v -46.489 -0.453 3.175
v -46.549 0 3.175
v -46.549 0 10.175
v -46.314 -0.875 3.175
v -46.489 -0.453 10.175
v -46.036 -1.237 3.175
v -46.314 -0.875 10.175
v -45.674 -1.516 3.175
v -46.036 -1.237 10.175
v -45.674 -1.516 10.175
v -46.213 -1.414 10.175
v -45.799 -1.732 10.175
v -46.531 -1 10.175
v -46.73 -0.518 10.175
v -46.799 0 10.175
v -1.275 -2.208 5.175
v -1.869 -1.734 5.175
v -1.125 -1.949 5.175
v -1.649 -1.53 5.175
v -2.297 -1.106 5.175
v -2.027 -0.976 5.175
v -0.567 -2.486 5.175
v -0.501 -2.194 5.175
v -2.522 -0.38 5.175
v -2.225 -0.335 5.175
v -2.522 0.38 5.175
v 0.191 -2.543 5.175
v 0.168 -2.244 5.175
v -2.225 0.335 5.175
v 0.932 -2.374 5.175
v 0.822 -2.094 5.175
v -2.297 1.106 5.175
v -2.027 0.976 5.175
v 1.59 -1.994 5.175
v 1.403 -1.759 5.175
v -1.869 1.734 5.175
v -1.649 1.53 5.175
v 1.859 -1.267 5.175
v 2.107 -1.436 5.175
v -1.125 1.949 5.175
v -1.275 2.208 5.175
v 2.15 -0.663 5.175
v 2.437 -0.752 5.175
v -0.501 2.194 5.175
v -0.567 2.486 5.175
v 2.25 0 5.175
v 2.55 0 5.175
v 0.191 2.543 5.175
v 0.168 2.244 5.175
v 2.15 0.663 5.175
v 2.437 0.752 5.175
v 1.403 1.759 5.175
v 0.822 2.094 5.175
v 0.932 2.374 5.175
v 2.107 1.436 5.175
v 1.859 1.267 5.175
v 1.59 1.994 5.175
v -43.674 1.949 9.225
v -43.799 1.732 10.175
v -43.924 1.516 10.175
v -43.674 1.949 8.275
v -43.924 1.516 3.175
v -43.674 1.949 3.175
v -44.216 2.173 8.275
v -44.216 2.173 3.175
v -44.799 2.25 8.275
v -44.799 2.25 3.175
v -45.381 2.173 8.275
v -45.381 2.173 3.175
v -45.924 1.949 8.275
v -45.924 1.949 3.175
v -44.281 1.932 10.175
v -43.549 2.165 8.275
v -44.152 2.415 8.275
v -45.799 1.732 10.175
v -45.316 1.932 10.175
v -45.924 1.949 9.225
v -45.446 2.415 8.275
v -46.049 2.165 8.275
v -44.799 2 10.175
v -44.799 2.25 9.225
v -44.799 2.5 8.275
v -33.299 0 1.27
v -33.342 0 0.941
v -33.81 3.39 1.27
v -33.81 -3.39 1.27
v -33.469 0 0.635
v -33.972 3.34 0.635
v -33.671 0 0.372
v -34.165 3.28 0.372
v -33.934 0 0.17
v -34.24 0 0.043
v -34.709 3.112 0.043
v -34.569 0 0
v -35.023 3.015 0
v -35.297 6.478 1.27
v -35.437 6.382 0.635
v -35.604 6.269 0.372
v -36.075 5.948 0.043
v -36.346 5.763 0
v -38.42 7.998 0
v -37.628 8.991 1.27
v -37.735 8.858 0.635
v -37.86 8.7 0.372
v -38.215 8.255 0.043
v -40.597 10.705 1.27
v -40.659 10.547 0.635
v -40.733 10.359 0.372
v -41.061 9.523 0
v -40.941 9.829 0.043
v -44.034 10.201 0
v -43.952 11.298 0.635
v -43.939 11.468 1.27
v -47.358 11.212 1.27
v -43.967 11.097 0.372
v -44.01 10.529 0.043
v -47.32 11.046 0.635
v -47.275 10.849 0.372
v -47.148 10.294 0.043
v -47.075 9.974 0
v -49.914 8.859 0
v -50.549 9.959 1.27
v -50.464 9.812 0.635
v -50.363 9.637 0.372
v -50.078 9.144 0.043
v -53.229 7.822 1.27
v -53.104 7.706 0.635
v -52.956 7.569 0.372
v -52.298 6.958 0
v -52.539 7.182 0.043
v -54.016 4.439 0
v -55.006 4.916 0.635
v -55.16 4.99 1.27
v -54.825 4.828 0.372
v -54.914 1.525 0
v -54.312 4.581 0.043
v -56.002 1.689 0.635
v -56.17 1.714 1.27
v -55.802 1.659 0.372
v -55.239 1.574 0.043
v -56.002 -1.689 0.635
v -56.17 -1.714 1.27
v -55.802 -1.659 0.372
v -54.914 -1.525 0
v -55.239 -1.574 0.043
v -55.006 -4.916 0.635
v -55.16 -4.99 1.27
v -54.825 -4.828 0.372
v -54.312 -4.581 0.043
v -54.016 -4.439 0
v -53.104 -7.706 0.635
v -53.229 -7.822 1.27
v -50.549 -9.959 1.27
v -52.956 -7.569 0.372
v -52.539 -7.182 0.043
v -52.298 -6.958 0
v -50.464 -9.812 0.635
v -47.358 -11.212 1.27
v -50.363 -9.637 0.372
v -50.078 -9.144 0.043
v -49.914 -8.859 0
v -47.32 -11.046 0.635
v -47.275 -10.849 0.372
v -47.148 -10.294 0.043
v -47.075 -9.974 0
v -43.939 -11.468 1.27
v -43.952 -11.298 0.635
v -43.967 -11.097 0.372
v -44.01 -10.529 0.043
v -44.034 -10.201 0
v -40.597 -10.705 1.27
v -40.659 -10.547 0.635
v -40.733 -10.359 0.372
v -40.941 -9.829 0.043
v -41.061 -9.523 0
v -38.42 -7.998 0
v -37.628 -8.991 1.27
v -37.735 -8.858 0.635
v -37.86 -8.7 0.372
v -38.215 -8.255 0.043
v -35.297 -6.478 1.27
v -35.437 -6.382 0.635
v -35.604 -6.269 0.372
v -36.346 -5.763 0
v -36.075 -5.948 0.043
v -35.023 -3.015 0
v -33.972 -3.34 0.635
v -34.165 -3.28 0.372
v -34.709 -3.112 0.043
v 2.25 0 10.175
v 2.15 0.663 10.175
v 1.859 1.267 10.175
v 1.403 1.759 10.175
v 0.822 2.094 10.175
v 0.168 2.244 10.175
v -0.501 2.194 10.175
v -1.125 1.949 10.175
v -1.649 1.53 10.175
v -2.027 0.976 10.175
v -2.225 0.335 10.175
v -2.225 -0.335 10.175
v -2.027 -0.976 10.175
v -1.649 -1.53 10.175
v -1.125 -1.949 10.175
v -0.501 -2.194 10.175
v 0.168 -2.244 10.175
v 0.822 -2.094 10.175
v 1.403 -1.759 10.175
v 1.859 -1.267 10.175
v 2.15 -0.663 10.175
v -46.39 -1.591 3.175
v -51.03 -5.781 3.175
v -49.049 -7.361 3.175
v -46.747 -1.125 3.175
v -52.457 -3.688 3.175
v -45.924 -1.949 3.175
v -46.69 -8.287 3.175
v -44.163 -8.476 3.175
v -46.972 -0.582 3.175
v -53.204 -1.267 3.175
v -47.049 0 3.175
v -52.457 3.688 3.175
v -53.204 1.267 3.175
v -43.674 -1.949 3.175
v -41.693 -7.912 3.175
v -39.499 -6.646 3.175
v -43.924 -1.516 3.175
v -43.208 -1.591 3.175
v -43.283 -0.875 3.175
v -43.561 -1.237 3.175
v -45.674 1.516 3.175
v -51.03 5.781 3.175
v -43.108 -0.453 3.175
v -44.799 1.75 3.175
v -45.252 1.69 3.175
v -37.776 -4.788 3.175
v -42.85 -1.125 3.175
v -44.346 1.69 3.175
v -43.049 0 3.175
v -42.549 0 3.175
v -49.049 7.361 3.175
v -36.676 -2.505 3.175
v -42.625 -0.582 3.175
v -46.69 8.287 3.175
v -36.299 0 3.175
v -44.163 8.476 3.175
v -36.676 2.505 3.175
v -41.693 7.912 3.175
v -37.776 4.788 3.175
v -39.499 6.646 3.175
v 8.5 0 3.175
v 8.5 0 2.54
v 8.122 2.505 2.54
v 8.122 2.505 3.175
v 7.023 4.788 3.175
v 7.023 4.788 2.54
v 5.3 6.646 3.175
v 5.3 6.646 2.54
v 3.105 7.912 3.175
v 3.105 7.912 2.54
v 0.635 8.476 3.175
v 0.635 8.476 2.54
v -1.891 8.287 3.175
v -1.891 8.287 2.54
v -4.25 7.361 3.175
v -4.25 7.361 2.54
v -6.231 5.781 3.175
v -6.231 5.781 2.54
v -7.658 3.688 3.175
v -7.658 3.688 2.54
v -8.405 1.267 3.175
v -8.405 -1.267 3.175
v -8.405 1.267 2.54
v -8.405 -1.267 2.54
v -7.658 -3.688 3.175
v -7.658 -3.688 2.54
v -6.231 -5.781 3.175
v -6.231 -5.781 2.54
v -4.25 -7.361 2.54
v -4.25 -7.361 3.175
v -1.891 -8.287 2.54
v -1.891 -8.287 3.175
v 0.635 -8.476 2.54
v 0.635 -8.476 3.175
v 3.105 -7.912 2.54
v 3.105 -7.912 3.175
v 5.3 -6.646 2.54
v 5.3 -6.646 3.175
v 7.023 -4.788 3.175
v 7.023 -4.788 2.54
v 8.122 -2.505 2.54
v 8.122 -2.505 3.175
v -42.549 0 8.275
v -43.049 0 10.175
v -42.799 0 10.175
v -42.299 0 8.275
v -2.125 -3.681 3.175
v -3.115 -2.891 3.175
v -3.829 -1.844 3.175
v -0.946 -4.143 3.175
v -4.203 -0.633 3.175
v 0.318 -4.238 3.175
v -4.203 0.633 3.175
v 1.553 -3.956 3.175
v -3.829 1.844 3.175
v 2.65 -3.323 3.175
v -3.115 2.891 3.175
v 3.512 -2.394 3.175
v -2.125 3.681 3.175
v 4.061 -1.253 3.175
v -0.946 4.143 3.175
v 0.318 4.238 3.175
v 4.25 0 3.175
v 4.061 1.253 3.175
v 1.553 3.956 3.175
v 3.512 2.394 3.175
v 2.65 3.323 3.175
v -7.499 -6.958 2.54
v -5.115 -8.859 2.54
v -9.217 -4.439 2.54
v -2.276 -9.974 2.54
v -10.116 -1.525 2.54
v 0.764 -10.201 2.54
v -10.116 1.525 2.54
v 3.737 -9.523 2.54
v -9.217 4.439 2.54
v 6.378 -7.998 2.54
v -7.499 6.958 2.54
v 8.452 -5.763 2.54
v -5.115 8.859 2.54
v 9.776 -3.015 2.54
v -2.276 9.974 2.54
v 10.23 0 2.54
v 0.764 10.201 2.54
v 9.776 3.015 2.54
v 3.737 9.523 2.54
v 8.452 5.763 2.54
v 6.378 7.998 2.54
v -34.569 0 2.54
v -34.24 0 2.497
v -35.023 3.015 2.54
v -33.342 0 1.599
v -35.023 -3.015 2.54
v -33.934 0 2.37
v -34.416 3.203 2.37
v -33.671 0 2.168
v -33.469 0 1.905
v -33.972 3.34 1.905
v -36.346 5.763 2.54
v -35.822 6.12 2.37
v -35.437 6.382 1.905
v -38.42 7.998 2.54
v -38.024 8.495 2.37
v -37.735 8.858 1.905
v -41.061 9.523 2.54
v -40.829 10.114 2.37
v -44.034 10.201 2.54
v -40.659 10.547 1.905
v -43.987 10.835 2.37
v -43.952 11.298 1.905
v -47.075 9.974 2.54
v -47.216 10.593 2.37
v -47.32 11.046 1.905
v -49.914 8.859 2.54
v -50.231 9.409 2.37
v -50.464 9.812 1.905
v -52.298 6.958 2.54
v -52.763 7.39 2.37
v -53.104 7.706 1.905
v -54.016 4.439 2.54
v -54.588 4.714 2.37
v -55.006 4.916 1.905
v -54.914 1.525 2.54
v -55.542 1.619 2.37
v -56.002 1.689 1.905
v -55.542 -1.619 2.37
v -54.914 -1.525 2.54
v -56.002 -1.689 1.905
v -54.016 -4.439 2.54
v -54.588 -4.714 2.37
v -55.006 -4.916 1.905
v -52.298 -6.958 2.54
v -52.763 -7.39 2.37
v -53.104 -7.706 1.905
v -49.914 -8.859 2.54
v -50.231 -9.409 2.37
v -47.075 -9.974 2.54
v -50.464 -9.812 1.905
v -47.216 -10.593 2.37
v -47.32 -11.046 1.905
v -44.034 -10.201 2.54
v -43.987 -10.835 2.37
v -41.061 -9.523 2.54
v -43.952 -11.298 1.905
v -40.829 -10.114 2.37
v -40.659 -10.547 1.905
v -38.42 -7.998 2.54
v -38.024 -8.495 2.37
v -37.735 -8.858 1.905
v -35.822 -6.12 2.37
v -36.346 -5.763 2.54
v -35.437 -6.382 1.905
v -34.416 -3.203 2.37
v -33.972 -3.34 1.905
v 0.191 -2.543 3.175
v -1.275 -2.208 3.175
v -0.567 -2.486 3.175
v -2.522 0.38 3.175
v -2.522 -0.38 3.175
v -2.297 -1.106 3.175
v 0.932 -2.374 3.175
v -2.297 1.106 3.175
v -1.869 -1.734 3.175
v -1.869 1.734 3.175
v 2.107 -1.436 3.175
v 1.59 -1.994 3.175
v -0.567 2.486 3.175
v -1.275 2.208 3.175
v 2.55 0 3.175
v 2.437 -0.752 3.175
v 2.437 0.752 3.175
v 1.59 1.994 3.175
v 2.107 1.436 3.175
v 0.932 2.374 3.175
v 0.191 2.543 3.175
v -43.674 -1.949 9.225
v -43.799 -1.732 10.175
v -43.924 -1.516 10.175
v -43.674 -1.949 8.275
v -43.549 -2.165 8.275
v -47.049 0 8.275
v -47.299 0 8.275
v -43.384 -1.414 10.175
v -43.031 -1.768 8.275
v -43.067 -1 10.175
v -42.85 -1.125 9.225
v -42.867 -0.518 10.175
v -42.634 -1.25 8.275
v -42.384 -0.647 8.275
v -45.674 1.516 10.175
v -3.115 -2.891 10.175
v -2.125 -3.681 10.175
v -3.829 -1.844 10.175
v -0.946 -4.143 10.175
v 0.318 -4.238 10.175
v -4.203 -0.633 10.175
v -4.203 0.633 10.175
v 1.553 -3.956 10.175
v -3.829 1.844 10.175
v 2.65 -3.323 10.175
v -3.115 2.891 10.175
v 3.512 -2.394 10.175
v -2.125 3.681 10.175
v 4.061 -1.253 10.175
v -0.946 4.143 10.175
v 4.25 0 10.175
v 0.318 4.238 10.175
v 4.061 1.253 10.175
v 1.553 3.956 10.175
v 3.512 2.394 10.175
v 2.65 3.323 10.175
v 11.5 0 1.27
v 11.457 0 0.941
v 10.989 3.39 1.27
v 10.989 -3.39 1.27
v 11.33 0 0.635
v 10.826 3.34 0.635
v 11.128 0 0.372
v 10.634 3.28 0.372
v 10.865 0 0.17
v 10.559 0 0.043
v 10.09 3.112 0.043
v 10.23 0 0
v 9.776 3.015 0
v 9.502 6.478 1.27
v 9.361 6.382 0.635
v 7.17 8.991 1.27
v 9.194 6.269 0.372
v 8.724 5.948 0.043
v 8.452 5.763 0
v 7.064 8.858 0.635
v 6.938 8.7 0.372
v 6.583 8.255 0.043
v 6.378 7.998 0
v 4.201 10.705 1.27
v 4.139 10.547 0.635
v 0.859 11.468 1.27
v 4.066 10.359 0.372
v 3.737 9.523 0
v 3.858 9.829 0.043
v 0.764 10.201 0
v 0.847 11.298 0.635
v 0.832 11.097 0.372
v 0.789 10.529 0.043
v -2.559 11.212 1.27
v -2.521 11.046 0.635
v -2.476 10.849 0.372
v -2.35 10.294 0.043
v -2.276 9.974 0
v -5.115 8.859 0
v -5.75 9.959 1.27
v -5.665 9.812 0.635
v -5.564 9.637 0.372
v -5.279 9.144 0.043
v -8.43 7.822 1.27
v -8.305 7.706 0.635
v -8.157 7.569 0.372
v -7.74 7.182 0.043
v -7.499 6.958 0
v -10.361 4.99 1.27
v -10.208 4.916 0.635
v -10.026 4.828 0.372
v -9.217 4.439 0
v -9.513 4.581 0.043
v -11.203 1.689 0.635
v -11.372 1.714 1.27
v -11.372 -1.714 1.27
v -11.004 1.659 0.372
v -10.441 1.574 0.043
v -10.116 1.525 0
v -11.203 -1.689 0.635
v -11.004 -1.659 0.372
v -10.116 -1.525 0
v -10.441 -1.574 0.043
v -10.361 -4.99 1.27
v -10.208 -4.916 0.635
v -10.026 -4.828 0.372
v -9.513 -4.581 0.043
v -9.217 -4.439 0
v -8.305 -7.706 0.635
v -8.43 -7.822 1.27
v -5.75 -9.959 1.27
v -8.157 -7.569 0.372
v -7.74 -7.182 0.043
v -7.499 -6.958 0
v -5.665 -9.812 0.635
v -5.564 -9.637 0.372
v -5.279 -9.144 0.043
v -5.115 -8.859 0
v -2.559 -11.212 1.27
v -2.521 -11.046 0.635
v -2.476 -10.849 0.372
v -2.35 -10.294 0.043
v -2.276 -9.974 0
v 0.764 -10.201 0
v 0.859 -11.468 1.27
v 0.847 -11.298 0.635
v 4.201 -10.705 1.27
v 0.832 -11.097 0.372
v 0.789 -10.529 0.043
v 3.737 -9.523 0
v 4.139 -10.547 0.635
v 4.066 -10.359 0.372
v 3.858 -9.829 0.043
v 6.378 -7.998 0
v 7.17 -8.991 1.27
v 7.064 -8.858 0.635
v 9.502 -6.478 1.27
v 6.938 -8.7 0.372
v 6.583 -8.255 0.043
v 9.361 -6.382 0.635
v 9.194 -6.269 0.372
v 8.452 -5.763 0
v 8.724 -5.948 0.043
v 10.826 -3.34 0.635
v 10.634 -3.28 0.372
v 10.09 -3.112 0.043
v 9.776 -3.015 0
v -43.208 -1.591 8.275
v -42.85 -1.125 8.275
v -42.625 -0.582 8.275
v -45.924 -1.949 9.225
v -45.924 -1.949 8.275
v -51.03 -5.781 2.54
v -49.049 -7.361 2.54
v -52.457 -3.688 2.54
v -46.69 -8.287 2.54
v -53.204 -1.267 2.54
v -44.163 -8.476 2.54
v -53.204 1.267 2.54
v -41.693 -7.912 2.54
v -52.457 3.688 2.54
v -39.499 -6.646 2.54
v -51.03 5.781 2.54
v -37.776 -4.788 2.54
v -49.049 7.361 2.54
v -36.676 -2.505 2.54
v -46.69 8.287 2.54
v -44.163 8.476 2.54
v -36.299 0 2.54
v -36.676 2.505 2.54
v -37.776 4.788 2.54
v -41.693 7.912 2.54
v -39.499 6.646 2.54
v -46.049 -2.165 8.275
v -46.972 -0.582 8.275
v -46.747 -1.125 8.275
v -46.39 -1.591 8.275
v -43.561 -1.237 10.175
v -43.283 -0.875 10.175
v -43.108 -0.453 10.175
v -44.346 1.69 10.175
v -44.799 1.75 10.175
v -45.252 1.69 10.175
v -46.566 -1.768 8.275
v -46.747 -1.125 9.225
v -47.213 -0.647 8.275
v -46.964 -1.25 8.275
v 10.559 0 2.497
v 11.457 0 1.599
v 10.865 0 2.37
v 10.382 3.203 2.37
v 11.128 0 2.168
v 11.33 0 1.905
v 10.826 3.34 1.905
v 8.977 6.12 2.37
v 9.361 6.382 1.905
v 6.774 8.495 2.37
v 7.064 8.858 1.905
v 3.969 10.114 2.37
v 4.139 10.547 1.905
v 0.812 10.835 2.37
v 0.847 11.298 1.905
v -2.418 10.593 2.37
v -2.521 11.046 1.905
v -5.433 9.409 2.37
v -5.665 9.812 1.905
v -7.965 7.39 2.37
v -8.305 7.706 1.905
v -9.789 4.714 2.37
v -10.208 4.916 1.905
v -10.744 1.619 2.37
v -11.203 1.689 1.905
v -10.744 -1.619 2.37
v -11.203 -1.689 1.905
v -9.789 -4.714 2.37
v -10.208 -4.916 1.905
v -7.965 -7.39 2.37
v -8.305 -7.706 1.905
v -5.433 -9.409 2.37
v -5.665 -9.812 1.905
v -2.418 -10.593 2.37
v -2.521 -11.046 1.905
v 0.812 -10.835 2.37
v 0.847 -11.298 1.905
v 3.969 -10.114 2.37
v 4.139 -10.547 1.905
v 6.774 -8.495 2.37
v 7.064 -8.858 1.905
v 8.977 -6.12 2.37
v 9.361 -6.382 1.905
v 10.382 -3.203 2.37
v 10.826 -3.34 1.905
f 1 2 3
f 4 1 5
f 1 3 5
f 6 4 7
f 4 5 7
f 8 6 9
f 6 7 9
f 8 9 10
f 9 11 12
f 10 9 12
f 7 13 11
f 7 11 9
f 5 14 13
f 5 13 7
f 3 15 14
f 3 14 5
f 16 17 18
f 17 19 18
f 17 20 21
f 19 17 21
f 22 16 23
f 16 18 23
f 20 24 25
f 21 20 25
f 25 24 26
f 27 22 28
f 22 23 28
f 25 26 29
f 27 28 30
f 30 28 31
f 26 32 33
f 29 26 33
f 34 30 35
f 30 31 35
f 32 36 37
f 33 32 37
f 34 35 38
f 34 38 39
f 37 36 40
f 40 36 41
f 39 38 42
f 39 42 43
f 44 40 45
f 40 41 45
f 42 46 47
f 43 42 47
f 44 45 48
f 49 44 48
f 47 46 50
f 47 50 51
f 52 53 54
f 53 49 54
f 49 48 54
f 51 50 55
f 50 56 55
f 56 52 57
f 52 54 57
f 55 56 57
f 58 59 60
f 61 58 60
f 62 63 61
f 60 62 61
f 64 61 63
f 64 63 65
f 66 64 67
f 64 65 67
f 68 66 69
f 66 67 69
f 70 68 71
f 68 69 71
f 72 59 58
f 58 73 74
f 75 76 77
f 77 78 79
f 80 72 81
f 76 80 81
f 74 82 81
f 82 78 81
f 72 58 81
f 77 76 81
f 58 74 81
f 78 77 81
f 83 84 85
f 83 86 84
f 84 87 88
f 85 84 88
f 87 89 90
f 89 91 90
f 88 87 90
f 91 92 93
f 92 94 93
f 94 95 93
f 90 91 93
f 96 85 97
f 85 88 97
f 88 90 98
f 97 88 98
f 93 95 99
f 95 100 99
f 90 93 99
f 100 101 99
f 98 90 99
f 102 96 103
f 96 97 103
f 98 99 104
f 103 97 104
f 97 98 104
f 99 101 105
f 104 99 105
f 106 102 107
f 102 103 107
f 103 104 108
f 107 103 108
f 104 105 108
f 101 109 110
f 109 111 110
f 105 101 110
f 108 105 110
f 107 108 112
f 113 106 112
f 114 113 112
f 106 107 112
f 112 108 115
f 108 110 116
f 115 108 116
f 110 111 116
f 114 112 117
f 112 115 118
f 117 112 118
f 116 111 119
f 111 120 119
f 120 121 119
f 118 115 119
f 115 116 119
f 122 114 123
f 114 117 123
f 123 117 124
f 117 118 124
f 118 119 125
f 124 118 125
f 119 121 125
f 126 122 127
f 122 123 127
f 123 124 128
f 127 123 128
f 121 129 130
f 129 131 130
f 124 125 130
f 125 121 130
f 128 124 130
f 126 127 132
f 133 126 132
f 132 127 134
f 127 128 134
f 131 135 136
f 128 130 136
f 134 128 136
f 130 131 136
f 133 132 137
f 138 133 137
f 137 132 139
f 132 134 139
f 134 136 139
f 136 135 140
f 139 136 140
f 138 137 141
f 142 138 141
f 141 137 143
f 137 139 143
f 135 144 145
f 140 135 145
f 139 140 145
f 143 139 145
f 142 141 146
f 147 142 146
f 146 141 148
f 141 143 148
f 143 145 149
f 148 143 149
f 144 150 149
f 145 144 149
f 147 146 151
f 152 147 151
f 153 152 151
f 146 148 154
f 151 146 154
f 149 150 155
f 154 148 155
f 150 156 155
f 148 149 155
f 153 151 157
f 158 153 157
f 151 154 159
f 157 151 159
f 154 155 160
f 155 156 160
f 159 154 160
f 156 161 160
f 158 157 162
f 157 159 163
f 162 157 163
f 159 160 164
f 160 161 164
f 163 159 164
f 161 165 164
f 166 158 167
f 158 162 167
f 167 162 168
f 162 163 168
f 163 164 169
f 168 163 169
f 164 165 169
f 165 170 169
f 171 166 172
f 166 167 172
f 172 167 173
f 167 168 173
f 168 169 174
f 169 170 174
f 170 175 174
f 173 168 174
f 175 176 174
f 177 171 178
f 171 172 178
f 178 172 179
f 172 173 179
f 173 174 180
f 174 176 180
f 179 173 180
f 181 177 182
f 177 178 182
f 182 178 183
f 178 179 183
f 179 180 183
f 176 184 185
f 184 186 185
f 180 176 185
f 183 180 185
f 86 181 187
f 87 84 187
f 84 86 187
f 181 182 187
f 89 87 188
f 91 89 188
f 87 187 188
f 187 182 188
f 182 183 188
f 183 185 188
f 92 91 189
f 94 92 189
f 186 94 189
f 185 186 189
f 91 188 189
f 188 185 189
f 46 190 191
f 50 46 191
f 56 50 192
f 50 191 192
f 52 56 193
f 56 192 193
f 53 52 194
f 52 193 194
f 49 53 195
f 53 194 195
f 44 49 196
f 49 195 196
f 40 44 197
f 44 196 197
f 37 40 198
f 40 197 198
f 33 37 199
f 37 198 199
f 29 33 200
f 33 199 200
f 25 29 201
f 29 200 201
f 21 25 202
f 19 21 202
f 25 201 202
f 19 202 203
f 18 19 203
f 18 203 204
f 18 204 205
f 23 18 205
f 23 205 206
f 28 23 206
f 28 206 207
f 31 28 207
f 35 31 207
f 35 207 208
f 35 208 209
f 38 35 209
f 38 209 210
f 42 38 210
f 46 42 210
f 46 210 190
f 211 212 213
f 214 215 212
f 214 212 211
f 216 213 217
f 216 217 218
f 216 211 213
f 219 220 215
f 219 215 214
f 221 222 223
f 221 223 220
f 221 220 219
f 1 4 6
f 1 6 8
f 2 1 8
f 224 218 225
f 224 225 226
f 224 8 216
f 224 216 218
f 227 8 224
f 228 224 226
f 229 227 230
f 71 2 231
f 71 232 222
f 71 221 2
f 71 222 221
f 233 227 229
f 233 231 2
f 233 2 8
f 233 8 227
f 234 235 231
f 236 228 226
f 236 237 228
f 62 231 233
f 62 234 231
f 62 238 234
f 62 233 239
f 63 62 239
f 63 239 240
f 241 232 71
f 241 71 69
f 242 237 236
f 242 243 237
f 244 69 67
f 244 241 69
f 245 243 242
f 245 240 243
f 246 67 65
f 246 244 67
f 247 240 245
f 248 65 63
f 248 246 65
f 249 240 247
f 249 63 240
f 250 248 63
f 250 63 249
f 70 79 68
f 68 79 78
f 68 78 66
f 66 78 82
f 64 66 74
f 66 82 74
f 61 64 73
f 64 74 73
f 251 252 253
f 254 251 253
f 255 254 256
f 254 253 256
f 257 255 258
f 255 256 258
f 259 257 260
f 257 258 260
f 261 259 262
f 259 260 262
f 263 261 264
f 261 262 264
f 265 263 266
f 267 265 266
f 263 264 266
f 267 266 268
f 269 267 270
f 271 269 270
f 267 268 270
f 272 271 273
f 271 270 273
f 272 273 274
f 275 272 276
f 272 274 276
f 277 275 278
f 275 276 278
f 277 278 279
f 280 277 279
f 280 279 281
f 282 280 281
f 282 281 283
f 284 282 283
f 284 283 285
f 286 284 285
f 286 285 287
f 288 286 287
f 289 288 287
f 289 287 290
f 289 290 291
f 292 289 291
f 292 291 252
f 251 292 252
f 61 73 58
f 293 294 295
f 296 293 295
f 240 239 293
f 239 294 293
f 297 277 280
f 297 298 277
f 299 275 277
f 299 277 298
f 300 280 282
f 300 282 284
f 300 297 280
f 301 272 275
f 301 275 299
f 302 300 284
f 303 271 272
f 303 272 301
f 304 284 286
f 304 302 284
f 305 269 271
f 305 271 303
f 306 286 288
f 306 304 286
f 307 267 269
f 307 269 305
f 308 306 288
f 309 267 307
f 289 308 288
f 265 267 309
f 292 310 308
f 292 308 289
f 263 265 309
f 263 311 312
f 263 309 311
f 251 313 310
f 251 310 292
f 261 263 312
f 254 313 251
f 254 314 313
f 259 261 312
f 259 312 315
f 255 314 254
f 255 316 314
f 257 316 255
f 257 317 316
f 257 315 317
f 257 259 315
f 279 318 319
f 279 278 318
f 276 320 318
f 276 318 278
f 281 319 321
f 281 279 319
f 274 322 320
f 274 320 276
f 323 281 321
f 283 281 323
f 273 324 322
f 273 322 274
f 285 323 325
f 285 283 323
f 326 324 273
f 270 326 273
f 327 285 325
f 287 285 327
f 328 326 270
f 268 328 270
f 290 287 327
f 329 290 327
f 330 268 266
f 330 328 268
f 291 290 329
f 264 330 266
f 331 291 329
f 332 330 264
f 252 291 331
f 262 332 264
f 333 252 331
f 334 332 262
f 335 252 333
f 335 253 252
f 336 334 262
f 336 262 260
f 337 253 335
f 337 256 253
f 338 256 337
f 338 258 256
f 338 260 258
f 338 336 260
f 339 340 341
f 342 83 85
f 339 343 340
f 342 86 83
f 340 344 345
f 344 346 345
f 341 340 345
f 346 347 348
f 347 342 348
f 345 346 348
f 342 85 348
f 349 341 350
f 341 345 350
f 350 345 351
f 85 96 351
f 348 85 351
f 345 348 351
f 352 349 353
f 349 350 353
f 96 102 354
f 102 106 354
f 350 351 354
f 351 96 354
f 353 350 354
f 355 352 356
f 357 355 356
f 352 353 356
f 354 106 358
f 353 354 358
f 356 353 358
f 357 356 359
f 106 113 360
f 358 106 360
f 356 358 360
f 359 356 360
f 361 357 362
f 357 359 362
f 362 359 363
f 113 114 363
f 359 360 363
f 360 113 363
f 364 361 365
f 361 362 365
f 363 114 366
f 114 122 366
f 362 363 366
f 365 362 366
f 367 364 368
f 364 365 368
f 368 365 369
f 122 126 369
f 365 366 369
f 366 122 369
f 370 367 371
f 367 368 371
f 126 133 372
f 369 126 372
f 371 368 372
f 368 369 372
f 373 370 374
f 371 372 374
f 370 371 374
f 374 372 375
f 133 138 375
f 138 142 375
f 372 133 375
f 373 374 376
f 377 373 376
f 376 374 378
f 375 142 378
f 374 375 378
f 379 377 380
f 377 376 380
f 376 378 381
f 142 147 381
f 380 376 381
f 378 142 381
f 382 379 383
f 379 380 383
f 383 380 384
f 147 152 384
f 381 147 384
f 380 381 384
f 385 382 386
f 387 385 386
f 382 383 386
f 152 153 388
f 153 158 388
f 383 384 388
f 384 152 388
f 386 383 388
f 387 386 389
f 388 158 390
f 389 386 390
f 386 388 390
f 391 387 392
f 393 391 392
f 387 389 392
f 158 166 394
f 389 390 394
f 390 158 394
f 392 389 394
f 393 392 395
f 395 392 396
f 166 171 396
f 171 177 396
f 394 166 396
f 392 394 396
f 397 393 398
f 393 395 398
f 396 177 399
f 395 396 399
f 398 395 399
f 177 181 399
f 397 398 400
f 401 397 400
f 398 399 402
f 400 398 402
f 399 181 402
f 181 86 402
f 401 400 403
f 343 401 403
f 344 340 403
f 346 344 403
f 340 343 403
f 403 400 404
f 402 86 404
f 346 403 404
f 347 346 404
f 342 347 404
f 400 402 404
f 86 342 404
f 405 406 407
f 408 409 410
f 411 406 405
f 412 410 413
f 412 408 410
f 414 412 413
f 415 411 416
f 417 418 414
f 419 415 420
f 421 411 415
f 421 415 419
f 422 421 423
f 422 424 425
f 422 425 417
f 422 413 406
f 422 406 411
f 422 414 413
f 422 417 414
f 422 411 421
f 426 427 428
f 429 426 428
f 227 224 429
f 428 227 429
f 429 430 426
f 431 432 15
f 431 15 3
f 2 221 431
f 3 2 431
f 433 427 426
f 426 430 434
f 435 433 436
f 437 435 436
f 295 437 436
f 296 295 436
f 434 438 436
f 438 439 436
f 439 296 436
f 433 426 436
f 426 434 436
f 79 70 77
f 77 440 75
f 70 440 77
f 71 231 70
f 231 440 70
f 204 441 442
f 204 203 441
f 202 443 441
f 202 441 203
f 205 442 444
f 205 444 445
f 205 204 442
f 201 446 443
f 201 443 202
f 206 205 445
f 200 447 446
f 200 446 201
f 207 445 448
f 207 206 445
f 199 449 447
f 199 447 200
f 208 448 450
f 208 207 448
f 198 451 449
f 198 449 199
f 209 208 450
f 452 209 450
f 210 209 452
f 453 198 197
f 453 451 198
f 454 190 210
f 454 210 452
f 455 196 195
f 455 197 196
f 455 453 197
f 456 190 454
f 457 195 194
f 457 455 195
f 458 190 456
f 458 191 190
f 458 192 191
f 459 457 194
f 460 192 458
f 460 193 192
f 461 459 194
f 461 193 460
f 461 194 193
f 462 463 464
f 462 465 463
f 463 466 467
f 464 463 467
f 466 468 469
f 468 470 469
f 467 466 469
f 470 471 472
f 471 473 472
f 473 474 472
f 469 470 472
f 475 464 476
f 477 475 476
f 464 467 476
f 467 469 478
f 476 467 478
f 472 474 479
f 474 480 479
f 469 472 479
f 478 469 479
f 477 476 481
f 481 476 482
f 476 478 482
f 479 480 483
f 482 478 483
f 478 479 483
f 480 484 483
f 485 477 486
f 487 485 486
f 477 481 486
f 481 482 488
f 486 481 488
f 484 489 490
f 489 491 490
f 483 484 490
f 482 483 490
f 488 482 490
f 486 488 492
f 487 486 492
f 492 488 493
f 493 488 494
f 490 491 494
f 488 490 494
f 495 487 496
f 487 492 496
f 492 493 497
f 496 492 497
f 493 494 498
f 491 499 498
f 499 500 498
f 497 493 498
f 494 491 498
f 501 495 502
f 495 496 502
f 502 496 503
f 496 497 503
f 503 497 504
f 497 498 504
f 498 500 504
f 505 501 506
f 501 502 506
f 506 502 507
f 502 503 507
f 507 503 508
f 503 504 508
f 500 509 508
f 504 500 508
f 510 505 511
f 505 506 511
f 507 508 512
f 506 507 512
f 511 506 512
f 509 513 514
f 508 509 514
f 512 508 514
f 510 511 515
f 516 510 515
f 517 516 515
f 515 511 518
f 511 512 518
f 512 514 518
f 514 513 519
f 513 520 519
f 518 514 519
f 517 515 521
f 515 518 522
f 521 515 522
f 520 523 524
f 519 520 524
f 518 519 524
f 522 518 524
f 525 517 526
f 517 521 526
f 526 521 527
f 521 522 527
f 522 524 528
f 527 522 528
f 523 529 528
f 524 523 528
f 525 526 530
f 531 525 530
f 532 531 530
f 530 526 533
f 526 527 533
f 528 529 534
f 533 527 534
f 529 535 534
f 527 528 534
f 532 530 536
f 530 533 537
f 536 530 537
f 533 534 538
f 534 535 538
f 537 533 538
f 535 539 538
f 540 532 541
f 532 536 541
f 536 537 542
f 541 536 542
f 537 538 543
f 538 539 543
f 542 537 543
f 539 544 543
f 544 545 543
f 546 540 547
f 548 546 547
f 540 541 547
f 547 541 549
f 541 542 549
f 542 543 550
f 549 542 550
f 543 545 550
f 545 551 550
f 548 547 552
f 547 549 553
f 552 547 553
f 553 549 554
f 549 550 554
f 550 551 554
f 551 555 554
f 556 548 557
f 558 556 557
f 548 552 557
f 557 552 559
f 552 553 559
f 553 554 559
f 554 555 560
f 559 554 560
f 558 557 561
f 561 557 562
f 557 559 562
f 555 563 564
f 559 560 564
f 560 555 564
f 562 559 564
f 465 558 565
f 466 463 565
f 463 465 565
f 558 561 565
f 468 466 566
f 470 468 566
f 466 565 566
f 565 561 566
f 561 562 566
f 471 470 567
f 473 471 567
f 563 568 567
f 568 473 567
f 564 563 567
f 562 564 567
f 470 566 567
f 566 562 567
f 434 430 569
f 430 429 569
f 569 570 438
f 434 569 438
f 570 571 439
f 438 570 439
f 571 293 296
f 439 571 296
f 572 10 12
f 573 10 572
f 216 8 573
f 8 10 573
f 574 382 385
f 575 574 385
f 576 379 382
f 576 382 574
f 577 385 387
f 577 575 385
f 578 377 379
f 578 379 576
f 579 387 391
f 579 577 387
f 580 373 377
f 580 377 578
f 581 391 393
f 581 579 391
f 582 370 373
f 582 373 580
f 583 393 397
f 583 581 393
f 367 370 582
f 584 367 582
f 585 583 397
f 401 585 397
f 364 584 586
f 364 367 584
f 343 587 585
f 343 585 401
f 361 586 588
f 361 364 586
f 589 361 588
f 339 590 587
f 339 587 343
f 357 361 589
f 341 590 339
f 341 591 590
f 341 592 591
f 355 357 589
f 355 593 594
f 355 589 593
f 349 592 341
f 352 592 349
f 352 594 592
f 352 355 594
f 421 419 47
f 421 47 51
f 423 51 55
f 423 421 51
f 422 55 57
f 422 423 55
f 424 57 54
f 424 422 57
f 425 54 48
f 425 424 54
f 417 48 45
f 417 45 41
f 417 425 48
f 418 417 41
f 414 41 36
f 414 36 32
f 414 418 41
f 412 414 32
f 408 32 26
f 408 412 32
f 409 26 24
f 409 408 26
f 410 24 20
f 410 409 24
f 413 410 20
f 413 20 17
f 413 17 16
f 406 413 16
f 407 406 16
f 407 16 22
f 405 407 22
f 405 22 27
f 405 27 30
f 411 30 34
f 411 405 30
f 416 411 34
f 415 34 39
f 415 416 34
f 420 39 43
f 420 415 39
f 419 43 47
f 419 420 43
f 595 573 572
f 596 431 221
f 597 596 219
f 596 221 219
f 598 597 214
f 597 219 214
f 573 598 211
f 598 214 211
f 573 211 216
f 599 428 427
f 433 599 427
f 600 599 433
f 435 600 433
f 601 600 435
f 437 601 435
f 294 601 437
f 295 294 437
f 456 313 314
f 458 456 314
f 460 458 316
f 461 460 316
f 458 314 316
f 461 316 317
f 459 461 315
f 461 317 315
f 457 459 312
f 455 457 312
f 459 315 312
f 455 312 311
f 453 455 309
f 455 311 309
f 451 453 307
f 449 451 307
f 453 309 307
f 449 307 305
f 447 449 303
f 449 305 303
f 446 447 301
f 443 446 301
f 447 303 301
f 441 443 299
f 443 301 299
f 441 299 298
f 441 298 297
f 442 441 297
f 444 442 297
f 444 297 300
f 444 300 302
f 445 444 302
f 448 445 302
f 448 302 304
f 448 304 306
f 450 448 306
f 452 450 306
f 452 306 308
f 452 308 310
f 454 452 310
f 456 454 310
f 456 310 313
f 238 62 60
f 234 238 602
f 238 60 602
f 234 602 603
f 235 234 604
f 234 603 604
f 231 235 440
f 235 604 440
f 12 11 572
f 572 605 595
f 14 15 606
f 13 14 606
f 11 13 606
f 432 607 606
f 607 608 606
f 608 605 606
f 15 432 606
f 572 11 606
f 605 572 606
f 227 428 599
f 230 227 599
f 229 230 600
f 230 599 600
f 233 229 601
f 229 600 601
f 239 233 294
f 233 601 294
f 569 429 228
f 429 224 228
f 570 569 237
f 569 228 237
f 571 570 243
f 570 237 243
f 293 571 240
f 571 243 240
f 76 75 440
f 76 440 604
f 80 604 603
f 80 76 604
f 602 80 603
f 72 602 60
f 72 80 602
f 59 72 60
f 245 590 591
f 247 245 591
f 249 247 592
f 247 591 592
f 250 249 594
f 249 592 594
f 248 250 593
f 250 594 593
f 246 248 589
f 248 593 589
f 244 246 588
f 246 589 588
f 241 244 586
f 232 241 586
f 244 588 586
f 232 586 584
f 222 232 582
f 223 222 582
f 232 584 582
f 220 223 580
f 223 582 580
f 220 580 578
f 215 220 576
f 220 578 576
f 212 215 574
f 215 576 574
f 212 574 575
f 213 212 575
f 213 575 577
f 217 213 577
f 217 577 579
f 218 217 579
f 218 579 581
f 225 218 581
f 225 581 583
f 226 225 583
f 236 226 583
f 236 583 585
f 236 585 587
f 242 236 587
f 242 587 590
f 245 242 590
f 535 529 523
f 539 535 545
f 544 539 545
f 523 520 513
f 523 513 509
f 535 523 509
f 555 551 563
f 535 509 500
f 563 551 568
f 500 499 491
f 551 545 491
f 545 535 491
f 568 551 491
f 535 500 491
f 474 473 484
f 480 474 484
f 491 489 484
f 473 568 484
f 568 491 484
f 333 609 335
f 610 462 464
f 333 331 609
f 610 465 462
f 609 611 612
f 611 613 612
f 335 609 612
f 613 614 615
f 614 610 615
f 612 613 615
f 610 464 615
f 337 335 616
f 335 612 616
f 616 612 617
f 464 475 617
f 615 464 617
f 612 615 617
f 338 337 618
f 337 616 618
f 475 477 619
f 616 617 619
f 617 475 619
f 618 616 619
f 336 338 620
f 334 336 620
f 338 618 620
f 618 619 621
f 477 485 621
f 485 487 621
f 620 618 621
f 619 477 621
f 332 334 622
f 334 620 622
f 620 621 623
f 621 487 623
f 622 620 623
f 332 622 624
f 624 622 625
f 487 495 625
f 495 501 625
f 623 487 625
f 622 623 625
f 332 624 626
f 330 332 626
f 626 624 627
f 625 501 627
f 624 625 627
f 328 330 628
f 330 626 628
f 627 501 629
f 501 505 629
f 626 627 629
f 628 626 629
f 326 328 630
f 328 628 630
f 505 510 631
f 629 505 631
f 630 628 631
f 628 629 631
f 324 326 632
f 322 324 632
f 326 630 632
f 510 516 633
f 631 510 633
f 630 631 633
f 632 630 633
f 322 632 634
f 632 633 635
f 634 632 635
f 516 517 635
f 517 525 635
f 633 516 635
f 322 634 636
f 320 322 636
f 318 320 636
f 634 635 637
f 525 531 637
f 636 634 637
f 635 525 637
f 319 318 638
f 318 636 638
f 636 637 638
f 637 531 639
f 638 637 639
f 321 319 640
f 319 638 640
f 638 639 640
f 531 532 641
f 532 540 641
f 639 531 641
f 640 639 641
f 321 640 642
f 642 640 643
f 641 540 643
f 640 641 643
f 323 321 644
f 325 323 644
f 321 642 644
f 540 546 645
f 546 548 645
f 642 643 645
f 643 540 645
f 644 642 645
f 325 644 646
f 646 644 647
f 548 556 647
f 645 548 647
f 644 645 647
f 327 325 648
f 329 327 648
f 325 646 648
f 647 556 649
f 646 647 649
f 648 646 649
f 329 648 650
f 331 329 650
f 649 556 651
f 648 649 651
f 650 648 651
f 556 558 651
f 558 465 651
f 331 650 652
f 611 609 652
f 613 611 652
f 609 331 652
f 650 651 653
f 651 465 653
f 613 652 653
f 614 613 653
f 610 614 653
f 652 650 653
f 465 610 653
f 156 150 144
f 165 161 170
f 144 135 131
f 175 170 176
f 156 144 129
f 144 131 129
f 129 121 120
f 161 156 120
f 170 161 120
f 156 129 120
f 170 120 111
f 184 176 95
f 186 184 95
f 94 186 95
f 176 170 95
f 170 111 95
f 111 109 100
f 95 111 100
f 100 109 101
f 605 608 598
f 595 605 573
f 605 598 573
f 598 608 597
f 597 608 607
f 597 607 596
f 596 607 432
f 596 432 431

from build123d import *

# Parameters (mm, degrees)
F0_R      = 11.5
F0_R_2    = 8.5
F1_DEPTH  = 2.54
F0_R_3    = 4.25
F2_DEPTH  = 3.175
F3_DEPTH  = 10.175
F4_R      = 1.26999
F5_R      = 11.5
F5_R_2    = 8.5
F6_DEPTH  = 2.54
F5_R_3    = 2.5
F7_DEPTH  = 3.175
F8_DEPTH  = 10.175
F9_R      = 2.25
F10_DEPTH = 7
F11_R     = 1.26999
F12_R     = 2.55
F13_DEPTH = 2
F16_R     = 1.75
F17_DEPTH = 7
F19_DEPTH = 25.4


# Not quite as in the source:
# - a fillet or chamfer is up to 0.001 mm smaller than in the source, because OpenCascade refuses the exact size


with BuildPart() as f1:
    # F0 (on Top) → F1 (new body)
    with BuildSketch(Plane.XY):
        Circle(F0_R)
        Circle(F0_R_2, mode=Mode.SUBTRACT)
    extrude(amount=F1_DEPTH)

    # F0 (on Top) → F2 (join)
    with BuildSketch(Plane.XY):
        Circle(F0_R_2)
        Circle(F0_R_3, mode=Mode.SUBTRACT)
    extrude(amount=F2_DEPTH)

    # F0 (on Top) → F3 (join)
    with BuildSketch(Plane.XY):
        Circle(F0_R_3)
    extrude(amount=F3_DEPTH)

    # F4 (radius 1.27 in the source; OpenCascade refuses exactly that, so slightly less here)
    f4_edges = [f1.edges().sort_by_distance(p)[0] for p in [
        (-11.5, 0, 2.54),
        (-11.5, 0, 0),
    ]]
    fillet(f4_edges, radius=F4_R)

    # F9 (on face) → F10 (cut)
    with BuildSketch(Plane.XY.offset(10.175)):
        Circle(F9_R)
    extrude(amount=-F10_DEPTH, mode=Mode.SUBTRACT)

    # F12 (on face) → F13 (cut)
    with BuildSketch(Plane.XY.offset(3.175)):
        Circle(F12_R)
    extrude(amount=F13_DEPTH, mode=Mode.SUBTRACT)


with BuildPart() as f6:
    # F5 (on Top) → F6 (new body)
    with BuildSketch(Plane.XY):
        with Locations((-44.7985892718, 0)):
            Circle(F5_R)
        with Locations((-44.7985892718, 0)):
            Circle(F5_R_2, mode=Mode.SUBTRACT)
    extrude(amount=F6_DEPTH)

    # F5 (on Top) → F7 (join)
    with BuildSketch(Plane.XY):
        with Locations((-44.7985892718, 0)):
            Circle(F5_R_2)
        with Locations((-44.7985892718, 0)):
            Circle(F5_R_3, mode=Mode.SUBTRACT)
    extrude(amount=F7_DEPTH)

    # F5 (on Top) → F8 (join)
    with BuildSketch(Plane.XY):
        with Locations((-44.7985892718, 0)):
            Circle(F5_R_3)
    extrude(amount=F8_DEPTH)

    # F11 (radius 1.27 in the source; OpenCascade refuses exactly that, so slightly less here)
    f11_edges = [f6.edges().sort_by_distance(p)[0] for p in [
        (-56.298589, 0, 2.54),
        (-56.298589, 0, 0),
    ]]
    fillet(f11_edges, radius=F11_R)

    # F14 (on Front) → F15 (revolve, cut)
    with BuildSketch(Plane.XZ):
        Polygon((-42.5485892718, 8.275), (-42.5485892718, 3.175), (-41.8997183442, 3.175), (-41.6368916631, 8.275), (-42.2985892718, 8.275), align=None)
        Polygon((-42.5485892718, 10.175), (-42.7985892718, 10.175), (-42.2985892718, 8.275), (-41.6368916631, 8.275), (-41.8774240868, 10.2633112086), align=None)
    revolve(axis=Axis((-44.7985892718, 0, 5.0875), (0, 0, 1)), mode=Mode.SUBTRACT)

    # F16 (on face) → F17 (cut)
    with BuildSketch(Plane.XY.offset(10.175)):
        with Locations((-44.7985892718, 0)):
            Circle(F16_R)
    extrude(amount=-F17_DEPTH, mode=Mode.SUBTRACT)

    # F18 (on face) → F19 (cut)
    with BuildSketch(Plane.XY.offset(3.175)):
        with BuildLine():
            Line((-45.9235892718, 1.9485571585), (-47.2724906726, 4.2849229191))
            ThreePointArc((-47.2724906726, 4.2849229191), (-49.0835121909, 2.4739014008), (-49.7463920734, 0))
            Line((-49.7463920734, 0), (-47.0485892718, 0))
            ThreePointArc((-47.0485892718, 0), (-46.7471464303, 1.125), (-45.9235892718, 1.9485571585))
        make_face()
        with BuildLine():
            Line((-47.0485892718, 0), (-44.7985892718, 0))
            Line((-44.7985892718, 0), (-45.9235892718, 1.9485571585))
            ThreePointArc((-45.9235892718, 1.9485571585), (-46.7471464303, 1.125), (-47.0485892718, 0))
        make_face()
        with BuildLine():
            Line((-42.5485892718, 0), (-39.8507864702, 0))
            ThreePointArc((-39.8507864702, 0), (-40.5136663527, 2.4739014008), (-42.324687871, 4.2849229191))
            Line((-42.324687871, 4.2849229191), (-43.6735892718, 1.9485571585))
            ThreePointArc((-43.6735892718, 1.9485571585), (-42.8500321132, 1.125), (-42.5485892718, 0))
        make_face()
        with BuildLine():
            Line((-44.7985892718, 0), (-42.5485892718, 0))
            ThreePointArc((-42.5485892718, 0), (-42.8500321132, 1.125), (-43.6735892718, 1.9485571585))
            Line((-43.6735892718, 1.9485571585), (-44.7985892718, 0))
        make_face()
        with BuildLine():
            ThreePointArc((-47.2724906726, -4.2849229191), (-44.7985892718, -4.9478028016), (-42.324687871, -4.2849229191))
            Line((-42.324687871, -4.2849229191), (-43.6735892718, -1.9485571585))
            ThreePointArc((-43.6735892718, -1.9485571585), (-44.7985892718, -2.25), (-45.9235892718, -1.9485571585))
            Line((-45.9235892718, -1.9485571585), (-47.2724906726, -4.2849229191))
        make_face()
        with BuildLine():
            Line((-43.6735892718, -1.9485571585), (-44.7985892718, 0))
            Line((-44.7985892718, 0), (-45.9235892718, -1.9485571585))
            ThreePointArc((-45.9235892718, -1.9485571585), (-44.7985892718, -2.25), (-43.6735892718, -1.9485571585))
        make_face()
    extrude(amount=F19_DEPTH, mode=Mode.SUBTRACT)


solid = Compound([f1.part, f6.part])
